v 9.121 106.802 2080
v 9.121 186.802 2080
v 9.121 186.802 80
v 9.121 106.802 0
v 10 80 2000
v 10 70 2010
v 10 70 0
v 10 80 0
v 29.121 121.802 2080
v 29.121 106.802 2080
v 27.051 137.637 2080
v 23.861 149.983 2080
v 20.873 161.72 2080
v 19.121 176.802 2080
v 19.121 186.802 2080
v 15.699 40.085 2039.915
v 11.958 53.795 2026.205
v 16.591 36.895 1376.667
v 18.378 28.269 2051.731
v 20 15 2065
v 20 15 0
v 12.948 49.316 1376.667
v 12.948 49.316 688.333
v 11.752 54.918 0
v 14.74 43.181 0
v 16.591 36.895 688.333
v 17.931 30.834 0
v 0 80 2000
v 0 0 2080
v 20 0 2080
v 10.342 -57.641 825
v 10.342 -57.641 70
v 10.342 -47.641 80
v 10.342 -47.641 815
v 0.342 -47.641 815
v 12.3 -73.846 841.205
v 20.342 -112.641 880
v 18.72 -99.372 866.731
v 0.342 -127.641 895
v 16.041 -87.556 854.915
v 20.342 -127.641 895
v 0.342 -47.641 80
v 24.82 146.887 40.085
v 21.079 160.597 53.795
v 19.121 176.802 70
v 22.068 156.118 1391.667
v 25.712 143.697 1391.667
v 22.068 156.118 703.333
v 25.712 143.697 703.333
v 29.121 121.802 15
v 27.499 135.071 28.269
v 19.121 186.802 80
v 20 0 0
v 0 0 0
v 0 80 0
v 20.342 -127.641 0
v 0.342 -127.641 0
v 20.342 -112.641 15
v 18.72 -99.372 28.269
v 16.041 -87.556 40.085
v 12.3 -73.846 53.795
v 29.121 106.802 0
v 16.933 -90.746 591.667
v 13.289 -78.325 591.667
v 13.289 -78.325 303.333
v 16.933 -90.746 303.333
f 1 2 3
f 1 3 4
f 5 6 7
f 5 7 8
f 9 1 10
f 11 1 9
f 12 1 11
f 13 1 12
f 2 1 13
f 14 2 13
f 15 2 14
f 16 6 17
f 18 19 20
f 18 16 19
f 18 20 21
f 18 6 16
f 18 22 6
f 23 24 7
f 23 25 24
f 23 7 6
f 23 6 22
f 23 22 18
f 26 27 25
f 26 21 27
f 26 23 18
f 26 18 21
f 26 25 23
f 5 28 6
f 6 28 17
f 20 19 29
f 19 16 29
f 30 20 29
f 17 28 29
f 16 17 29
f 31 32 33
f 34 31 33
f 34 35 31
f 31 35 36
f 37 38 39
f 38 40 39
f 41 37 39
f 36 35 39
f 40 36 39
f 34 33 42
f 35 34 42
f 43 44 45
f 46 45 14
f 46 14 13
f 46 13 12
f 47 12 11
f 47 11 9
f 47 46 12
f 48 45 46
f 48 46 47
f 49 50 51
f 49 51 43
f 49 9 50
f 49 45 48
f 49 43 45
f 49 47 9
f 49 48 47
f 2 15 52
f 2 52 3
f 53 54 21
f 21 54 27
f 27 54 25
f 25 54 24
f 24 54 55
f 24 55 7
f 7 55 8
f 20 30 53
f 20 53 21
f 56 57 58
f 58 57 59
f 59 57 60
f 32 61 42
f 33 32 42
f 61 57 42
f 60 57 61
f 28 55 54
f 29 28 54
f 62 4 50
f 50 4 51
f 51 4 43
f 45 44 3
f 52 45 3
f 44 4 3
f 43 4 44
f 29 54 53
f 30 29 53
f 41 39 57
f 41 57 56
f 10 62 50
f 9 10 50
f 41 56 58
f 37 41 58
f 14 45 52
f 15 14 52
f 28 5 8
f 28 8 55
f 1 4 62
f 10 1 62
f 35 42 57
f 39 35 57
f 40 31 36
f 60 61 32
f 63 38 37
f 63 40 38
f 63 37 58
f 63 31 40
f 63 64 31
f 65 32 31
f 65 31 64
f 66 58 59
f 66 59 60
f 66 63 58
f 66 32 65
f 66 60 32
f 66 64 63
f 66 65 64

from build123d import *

# Parameters (mm, degrees)
F1_DEPTH = 2080
F2_DEPTH = 2080
F3_DEPTH = 895
F7_DEPTH = 25
F8_DEPTH = 25
F9_DEPTH = 25


with BuildPart() as f1:
    # F0 (on Top) → F1 (new body)
    with BuildSketch(Plane.XY):
        with BuildLine():
            Line((0, 80), (0, 0))
            Line((0, 0), (20, 0))
            Line((20, 0), (20, 15))
            add(Edge.make_bspline(
                [(10, 70), (12.289603, 39.272137), (17.018117, 47.544636), (20, 15)],
                knots=[0, 0, 0, 0, 55.901699, 55.901699, 55.901699, 55.901699], degree=3))
            Line((10, 70), (10, 80))
            Line((10, 80), (0, 80))
        make_face()
    extrude(amount=F1_DEPTH)

    # F5 (on face) → F8 (cut)
    with BuildSketch(Plane(origin=(0, 0, 0), x_dir=(0, -1, 0), z_dir=(-1, 0, 0))):
        Polygon((-80, 2000), (0, 2080), (-80, 2080), align=None)
    extrude(amount=-F8_DEPTH, mode=Mode.SUBTRACT)


with BuildPart() as f2:
    # F0 (on Top) → F2 (new body)
    with BuildSketch(Plane.XY):
        with BuildLine():
            Line((9.120889, 186.802052), (9.120889, 106.802052))
            Line((9.120889, 106.802052), (29.120889, 106.802052))
            Line((29.120889, 106.802052), (29.120889, 121.802052))
            add(Edge.make_bspline(
                [(19.120889, 176.802052), (21.410493, 146.074189), (26.139006, 154.346688), (29.120889, 121.802052)],
                knots=[0, 0, 0, 0, 55.901699, 55.901699, 55.901699, 55.901699], degree=3))
            Line((19.120889, 176.802052), (19.120889, 186.802052))
            Line((19.120889, 186.802052), (9.120889, 186.802052))
        make_face()
    extrude(amount=F2_DEPTH)

    # F4 (on face) → F7 (cut)
    with BuildSketch(Plane(origin=(9.120889, 0, 0), x_dir=(0, -1, 0), z_dir=(-1, 0, 0))):
        Polygon((-186.802052, 0), (-106.802052, 0), (-186.802052, 80), align=None)
    extrude(amount=-F7_DEPTH, mode=Mode.SUBTRACT)


with BuildPart() as f3:
    # F0 (on Top) → F3 (new body)
    with BuildSketch(Plane.XY):
        with BuildLine():
            Line((0.34191, -47.640972), (0.34191, -127.640972))
            Line((0.34191, -127.640972), (20.34191, -127.640972))
            Line((20.34191, -127.640972), (20.34191, -112.640972))
            add(Edge.make_bspline(
                [(10.34191, -57.640972), (12.631514, -88.368835), (17.360027, -80.096336), (20.34191, -112.640972)],
                knots=[0, 0, 0, 0, 55.901699, 55.901699, 55.901699, 55.901699], degree=3))
            Line((10.34191, -57.640972), (10.34191, -47.640972))
            Line((10.34191, -47.640972), (0.34191, -47.640972))
        make_face()
    extrude(amount=F3_DEPTH)

    # F6 (on face) → F9 (cut)
    with BuildSketch(Plane(origin=(0.34191, 0, 0), x_dir=(0, -1, 0), z_dir=(-1, 0, 0))):
        Polygon((47.640972, 815), (127.640972, 895), (47.640972, 895), align=None)
        Polygon((47.640972, 0), (127.640972, 0), (47.640972, 80), align=None)
    extrude(amount=-F9_DEPTH, mode=Mode.SUBTRACT)


solid = Compound([f1.part, f2.part, f3.part])
